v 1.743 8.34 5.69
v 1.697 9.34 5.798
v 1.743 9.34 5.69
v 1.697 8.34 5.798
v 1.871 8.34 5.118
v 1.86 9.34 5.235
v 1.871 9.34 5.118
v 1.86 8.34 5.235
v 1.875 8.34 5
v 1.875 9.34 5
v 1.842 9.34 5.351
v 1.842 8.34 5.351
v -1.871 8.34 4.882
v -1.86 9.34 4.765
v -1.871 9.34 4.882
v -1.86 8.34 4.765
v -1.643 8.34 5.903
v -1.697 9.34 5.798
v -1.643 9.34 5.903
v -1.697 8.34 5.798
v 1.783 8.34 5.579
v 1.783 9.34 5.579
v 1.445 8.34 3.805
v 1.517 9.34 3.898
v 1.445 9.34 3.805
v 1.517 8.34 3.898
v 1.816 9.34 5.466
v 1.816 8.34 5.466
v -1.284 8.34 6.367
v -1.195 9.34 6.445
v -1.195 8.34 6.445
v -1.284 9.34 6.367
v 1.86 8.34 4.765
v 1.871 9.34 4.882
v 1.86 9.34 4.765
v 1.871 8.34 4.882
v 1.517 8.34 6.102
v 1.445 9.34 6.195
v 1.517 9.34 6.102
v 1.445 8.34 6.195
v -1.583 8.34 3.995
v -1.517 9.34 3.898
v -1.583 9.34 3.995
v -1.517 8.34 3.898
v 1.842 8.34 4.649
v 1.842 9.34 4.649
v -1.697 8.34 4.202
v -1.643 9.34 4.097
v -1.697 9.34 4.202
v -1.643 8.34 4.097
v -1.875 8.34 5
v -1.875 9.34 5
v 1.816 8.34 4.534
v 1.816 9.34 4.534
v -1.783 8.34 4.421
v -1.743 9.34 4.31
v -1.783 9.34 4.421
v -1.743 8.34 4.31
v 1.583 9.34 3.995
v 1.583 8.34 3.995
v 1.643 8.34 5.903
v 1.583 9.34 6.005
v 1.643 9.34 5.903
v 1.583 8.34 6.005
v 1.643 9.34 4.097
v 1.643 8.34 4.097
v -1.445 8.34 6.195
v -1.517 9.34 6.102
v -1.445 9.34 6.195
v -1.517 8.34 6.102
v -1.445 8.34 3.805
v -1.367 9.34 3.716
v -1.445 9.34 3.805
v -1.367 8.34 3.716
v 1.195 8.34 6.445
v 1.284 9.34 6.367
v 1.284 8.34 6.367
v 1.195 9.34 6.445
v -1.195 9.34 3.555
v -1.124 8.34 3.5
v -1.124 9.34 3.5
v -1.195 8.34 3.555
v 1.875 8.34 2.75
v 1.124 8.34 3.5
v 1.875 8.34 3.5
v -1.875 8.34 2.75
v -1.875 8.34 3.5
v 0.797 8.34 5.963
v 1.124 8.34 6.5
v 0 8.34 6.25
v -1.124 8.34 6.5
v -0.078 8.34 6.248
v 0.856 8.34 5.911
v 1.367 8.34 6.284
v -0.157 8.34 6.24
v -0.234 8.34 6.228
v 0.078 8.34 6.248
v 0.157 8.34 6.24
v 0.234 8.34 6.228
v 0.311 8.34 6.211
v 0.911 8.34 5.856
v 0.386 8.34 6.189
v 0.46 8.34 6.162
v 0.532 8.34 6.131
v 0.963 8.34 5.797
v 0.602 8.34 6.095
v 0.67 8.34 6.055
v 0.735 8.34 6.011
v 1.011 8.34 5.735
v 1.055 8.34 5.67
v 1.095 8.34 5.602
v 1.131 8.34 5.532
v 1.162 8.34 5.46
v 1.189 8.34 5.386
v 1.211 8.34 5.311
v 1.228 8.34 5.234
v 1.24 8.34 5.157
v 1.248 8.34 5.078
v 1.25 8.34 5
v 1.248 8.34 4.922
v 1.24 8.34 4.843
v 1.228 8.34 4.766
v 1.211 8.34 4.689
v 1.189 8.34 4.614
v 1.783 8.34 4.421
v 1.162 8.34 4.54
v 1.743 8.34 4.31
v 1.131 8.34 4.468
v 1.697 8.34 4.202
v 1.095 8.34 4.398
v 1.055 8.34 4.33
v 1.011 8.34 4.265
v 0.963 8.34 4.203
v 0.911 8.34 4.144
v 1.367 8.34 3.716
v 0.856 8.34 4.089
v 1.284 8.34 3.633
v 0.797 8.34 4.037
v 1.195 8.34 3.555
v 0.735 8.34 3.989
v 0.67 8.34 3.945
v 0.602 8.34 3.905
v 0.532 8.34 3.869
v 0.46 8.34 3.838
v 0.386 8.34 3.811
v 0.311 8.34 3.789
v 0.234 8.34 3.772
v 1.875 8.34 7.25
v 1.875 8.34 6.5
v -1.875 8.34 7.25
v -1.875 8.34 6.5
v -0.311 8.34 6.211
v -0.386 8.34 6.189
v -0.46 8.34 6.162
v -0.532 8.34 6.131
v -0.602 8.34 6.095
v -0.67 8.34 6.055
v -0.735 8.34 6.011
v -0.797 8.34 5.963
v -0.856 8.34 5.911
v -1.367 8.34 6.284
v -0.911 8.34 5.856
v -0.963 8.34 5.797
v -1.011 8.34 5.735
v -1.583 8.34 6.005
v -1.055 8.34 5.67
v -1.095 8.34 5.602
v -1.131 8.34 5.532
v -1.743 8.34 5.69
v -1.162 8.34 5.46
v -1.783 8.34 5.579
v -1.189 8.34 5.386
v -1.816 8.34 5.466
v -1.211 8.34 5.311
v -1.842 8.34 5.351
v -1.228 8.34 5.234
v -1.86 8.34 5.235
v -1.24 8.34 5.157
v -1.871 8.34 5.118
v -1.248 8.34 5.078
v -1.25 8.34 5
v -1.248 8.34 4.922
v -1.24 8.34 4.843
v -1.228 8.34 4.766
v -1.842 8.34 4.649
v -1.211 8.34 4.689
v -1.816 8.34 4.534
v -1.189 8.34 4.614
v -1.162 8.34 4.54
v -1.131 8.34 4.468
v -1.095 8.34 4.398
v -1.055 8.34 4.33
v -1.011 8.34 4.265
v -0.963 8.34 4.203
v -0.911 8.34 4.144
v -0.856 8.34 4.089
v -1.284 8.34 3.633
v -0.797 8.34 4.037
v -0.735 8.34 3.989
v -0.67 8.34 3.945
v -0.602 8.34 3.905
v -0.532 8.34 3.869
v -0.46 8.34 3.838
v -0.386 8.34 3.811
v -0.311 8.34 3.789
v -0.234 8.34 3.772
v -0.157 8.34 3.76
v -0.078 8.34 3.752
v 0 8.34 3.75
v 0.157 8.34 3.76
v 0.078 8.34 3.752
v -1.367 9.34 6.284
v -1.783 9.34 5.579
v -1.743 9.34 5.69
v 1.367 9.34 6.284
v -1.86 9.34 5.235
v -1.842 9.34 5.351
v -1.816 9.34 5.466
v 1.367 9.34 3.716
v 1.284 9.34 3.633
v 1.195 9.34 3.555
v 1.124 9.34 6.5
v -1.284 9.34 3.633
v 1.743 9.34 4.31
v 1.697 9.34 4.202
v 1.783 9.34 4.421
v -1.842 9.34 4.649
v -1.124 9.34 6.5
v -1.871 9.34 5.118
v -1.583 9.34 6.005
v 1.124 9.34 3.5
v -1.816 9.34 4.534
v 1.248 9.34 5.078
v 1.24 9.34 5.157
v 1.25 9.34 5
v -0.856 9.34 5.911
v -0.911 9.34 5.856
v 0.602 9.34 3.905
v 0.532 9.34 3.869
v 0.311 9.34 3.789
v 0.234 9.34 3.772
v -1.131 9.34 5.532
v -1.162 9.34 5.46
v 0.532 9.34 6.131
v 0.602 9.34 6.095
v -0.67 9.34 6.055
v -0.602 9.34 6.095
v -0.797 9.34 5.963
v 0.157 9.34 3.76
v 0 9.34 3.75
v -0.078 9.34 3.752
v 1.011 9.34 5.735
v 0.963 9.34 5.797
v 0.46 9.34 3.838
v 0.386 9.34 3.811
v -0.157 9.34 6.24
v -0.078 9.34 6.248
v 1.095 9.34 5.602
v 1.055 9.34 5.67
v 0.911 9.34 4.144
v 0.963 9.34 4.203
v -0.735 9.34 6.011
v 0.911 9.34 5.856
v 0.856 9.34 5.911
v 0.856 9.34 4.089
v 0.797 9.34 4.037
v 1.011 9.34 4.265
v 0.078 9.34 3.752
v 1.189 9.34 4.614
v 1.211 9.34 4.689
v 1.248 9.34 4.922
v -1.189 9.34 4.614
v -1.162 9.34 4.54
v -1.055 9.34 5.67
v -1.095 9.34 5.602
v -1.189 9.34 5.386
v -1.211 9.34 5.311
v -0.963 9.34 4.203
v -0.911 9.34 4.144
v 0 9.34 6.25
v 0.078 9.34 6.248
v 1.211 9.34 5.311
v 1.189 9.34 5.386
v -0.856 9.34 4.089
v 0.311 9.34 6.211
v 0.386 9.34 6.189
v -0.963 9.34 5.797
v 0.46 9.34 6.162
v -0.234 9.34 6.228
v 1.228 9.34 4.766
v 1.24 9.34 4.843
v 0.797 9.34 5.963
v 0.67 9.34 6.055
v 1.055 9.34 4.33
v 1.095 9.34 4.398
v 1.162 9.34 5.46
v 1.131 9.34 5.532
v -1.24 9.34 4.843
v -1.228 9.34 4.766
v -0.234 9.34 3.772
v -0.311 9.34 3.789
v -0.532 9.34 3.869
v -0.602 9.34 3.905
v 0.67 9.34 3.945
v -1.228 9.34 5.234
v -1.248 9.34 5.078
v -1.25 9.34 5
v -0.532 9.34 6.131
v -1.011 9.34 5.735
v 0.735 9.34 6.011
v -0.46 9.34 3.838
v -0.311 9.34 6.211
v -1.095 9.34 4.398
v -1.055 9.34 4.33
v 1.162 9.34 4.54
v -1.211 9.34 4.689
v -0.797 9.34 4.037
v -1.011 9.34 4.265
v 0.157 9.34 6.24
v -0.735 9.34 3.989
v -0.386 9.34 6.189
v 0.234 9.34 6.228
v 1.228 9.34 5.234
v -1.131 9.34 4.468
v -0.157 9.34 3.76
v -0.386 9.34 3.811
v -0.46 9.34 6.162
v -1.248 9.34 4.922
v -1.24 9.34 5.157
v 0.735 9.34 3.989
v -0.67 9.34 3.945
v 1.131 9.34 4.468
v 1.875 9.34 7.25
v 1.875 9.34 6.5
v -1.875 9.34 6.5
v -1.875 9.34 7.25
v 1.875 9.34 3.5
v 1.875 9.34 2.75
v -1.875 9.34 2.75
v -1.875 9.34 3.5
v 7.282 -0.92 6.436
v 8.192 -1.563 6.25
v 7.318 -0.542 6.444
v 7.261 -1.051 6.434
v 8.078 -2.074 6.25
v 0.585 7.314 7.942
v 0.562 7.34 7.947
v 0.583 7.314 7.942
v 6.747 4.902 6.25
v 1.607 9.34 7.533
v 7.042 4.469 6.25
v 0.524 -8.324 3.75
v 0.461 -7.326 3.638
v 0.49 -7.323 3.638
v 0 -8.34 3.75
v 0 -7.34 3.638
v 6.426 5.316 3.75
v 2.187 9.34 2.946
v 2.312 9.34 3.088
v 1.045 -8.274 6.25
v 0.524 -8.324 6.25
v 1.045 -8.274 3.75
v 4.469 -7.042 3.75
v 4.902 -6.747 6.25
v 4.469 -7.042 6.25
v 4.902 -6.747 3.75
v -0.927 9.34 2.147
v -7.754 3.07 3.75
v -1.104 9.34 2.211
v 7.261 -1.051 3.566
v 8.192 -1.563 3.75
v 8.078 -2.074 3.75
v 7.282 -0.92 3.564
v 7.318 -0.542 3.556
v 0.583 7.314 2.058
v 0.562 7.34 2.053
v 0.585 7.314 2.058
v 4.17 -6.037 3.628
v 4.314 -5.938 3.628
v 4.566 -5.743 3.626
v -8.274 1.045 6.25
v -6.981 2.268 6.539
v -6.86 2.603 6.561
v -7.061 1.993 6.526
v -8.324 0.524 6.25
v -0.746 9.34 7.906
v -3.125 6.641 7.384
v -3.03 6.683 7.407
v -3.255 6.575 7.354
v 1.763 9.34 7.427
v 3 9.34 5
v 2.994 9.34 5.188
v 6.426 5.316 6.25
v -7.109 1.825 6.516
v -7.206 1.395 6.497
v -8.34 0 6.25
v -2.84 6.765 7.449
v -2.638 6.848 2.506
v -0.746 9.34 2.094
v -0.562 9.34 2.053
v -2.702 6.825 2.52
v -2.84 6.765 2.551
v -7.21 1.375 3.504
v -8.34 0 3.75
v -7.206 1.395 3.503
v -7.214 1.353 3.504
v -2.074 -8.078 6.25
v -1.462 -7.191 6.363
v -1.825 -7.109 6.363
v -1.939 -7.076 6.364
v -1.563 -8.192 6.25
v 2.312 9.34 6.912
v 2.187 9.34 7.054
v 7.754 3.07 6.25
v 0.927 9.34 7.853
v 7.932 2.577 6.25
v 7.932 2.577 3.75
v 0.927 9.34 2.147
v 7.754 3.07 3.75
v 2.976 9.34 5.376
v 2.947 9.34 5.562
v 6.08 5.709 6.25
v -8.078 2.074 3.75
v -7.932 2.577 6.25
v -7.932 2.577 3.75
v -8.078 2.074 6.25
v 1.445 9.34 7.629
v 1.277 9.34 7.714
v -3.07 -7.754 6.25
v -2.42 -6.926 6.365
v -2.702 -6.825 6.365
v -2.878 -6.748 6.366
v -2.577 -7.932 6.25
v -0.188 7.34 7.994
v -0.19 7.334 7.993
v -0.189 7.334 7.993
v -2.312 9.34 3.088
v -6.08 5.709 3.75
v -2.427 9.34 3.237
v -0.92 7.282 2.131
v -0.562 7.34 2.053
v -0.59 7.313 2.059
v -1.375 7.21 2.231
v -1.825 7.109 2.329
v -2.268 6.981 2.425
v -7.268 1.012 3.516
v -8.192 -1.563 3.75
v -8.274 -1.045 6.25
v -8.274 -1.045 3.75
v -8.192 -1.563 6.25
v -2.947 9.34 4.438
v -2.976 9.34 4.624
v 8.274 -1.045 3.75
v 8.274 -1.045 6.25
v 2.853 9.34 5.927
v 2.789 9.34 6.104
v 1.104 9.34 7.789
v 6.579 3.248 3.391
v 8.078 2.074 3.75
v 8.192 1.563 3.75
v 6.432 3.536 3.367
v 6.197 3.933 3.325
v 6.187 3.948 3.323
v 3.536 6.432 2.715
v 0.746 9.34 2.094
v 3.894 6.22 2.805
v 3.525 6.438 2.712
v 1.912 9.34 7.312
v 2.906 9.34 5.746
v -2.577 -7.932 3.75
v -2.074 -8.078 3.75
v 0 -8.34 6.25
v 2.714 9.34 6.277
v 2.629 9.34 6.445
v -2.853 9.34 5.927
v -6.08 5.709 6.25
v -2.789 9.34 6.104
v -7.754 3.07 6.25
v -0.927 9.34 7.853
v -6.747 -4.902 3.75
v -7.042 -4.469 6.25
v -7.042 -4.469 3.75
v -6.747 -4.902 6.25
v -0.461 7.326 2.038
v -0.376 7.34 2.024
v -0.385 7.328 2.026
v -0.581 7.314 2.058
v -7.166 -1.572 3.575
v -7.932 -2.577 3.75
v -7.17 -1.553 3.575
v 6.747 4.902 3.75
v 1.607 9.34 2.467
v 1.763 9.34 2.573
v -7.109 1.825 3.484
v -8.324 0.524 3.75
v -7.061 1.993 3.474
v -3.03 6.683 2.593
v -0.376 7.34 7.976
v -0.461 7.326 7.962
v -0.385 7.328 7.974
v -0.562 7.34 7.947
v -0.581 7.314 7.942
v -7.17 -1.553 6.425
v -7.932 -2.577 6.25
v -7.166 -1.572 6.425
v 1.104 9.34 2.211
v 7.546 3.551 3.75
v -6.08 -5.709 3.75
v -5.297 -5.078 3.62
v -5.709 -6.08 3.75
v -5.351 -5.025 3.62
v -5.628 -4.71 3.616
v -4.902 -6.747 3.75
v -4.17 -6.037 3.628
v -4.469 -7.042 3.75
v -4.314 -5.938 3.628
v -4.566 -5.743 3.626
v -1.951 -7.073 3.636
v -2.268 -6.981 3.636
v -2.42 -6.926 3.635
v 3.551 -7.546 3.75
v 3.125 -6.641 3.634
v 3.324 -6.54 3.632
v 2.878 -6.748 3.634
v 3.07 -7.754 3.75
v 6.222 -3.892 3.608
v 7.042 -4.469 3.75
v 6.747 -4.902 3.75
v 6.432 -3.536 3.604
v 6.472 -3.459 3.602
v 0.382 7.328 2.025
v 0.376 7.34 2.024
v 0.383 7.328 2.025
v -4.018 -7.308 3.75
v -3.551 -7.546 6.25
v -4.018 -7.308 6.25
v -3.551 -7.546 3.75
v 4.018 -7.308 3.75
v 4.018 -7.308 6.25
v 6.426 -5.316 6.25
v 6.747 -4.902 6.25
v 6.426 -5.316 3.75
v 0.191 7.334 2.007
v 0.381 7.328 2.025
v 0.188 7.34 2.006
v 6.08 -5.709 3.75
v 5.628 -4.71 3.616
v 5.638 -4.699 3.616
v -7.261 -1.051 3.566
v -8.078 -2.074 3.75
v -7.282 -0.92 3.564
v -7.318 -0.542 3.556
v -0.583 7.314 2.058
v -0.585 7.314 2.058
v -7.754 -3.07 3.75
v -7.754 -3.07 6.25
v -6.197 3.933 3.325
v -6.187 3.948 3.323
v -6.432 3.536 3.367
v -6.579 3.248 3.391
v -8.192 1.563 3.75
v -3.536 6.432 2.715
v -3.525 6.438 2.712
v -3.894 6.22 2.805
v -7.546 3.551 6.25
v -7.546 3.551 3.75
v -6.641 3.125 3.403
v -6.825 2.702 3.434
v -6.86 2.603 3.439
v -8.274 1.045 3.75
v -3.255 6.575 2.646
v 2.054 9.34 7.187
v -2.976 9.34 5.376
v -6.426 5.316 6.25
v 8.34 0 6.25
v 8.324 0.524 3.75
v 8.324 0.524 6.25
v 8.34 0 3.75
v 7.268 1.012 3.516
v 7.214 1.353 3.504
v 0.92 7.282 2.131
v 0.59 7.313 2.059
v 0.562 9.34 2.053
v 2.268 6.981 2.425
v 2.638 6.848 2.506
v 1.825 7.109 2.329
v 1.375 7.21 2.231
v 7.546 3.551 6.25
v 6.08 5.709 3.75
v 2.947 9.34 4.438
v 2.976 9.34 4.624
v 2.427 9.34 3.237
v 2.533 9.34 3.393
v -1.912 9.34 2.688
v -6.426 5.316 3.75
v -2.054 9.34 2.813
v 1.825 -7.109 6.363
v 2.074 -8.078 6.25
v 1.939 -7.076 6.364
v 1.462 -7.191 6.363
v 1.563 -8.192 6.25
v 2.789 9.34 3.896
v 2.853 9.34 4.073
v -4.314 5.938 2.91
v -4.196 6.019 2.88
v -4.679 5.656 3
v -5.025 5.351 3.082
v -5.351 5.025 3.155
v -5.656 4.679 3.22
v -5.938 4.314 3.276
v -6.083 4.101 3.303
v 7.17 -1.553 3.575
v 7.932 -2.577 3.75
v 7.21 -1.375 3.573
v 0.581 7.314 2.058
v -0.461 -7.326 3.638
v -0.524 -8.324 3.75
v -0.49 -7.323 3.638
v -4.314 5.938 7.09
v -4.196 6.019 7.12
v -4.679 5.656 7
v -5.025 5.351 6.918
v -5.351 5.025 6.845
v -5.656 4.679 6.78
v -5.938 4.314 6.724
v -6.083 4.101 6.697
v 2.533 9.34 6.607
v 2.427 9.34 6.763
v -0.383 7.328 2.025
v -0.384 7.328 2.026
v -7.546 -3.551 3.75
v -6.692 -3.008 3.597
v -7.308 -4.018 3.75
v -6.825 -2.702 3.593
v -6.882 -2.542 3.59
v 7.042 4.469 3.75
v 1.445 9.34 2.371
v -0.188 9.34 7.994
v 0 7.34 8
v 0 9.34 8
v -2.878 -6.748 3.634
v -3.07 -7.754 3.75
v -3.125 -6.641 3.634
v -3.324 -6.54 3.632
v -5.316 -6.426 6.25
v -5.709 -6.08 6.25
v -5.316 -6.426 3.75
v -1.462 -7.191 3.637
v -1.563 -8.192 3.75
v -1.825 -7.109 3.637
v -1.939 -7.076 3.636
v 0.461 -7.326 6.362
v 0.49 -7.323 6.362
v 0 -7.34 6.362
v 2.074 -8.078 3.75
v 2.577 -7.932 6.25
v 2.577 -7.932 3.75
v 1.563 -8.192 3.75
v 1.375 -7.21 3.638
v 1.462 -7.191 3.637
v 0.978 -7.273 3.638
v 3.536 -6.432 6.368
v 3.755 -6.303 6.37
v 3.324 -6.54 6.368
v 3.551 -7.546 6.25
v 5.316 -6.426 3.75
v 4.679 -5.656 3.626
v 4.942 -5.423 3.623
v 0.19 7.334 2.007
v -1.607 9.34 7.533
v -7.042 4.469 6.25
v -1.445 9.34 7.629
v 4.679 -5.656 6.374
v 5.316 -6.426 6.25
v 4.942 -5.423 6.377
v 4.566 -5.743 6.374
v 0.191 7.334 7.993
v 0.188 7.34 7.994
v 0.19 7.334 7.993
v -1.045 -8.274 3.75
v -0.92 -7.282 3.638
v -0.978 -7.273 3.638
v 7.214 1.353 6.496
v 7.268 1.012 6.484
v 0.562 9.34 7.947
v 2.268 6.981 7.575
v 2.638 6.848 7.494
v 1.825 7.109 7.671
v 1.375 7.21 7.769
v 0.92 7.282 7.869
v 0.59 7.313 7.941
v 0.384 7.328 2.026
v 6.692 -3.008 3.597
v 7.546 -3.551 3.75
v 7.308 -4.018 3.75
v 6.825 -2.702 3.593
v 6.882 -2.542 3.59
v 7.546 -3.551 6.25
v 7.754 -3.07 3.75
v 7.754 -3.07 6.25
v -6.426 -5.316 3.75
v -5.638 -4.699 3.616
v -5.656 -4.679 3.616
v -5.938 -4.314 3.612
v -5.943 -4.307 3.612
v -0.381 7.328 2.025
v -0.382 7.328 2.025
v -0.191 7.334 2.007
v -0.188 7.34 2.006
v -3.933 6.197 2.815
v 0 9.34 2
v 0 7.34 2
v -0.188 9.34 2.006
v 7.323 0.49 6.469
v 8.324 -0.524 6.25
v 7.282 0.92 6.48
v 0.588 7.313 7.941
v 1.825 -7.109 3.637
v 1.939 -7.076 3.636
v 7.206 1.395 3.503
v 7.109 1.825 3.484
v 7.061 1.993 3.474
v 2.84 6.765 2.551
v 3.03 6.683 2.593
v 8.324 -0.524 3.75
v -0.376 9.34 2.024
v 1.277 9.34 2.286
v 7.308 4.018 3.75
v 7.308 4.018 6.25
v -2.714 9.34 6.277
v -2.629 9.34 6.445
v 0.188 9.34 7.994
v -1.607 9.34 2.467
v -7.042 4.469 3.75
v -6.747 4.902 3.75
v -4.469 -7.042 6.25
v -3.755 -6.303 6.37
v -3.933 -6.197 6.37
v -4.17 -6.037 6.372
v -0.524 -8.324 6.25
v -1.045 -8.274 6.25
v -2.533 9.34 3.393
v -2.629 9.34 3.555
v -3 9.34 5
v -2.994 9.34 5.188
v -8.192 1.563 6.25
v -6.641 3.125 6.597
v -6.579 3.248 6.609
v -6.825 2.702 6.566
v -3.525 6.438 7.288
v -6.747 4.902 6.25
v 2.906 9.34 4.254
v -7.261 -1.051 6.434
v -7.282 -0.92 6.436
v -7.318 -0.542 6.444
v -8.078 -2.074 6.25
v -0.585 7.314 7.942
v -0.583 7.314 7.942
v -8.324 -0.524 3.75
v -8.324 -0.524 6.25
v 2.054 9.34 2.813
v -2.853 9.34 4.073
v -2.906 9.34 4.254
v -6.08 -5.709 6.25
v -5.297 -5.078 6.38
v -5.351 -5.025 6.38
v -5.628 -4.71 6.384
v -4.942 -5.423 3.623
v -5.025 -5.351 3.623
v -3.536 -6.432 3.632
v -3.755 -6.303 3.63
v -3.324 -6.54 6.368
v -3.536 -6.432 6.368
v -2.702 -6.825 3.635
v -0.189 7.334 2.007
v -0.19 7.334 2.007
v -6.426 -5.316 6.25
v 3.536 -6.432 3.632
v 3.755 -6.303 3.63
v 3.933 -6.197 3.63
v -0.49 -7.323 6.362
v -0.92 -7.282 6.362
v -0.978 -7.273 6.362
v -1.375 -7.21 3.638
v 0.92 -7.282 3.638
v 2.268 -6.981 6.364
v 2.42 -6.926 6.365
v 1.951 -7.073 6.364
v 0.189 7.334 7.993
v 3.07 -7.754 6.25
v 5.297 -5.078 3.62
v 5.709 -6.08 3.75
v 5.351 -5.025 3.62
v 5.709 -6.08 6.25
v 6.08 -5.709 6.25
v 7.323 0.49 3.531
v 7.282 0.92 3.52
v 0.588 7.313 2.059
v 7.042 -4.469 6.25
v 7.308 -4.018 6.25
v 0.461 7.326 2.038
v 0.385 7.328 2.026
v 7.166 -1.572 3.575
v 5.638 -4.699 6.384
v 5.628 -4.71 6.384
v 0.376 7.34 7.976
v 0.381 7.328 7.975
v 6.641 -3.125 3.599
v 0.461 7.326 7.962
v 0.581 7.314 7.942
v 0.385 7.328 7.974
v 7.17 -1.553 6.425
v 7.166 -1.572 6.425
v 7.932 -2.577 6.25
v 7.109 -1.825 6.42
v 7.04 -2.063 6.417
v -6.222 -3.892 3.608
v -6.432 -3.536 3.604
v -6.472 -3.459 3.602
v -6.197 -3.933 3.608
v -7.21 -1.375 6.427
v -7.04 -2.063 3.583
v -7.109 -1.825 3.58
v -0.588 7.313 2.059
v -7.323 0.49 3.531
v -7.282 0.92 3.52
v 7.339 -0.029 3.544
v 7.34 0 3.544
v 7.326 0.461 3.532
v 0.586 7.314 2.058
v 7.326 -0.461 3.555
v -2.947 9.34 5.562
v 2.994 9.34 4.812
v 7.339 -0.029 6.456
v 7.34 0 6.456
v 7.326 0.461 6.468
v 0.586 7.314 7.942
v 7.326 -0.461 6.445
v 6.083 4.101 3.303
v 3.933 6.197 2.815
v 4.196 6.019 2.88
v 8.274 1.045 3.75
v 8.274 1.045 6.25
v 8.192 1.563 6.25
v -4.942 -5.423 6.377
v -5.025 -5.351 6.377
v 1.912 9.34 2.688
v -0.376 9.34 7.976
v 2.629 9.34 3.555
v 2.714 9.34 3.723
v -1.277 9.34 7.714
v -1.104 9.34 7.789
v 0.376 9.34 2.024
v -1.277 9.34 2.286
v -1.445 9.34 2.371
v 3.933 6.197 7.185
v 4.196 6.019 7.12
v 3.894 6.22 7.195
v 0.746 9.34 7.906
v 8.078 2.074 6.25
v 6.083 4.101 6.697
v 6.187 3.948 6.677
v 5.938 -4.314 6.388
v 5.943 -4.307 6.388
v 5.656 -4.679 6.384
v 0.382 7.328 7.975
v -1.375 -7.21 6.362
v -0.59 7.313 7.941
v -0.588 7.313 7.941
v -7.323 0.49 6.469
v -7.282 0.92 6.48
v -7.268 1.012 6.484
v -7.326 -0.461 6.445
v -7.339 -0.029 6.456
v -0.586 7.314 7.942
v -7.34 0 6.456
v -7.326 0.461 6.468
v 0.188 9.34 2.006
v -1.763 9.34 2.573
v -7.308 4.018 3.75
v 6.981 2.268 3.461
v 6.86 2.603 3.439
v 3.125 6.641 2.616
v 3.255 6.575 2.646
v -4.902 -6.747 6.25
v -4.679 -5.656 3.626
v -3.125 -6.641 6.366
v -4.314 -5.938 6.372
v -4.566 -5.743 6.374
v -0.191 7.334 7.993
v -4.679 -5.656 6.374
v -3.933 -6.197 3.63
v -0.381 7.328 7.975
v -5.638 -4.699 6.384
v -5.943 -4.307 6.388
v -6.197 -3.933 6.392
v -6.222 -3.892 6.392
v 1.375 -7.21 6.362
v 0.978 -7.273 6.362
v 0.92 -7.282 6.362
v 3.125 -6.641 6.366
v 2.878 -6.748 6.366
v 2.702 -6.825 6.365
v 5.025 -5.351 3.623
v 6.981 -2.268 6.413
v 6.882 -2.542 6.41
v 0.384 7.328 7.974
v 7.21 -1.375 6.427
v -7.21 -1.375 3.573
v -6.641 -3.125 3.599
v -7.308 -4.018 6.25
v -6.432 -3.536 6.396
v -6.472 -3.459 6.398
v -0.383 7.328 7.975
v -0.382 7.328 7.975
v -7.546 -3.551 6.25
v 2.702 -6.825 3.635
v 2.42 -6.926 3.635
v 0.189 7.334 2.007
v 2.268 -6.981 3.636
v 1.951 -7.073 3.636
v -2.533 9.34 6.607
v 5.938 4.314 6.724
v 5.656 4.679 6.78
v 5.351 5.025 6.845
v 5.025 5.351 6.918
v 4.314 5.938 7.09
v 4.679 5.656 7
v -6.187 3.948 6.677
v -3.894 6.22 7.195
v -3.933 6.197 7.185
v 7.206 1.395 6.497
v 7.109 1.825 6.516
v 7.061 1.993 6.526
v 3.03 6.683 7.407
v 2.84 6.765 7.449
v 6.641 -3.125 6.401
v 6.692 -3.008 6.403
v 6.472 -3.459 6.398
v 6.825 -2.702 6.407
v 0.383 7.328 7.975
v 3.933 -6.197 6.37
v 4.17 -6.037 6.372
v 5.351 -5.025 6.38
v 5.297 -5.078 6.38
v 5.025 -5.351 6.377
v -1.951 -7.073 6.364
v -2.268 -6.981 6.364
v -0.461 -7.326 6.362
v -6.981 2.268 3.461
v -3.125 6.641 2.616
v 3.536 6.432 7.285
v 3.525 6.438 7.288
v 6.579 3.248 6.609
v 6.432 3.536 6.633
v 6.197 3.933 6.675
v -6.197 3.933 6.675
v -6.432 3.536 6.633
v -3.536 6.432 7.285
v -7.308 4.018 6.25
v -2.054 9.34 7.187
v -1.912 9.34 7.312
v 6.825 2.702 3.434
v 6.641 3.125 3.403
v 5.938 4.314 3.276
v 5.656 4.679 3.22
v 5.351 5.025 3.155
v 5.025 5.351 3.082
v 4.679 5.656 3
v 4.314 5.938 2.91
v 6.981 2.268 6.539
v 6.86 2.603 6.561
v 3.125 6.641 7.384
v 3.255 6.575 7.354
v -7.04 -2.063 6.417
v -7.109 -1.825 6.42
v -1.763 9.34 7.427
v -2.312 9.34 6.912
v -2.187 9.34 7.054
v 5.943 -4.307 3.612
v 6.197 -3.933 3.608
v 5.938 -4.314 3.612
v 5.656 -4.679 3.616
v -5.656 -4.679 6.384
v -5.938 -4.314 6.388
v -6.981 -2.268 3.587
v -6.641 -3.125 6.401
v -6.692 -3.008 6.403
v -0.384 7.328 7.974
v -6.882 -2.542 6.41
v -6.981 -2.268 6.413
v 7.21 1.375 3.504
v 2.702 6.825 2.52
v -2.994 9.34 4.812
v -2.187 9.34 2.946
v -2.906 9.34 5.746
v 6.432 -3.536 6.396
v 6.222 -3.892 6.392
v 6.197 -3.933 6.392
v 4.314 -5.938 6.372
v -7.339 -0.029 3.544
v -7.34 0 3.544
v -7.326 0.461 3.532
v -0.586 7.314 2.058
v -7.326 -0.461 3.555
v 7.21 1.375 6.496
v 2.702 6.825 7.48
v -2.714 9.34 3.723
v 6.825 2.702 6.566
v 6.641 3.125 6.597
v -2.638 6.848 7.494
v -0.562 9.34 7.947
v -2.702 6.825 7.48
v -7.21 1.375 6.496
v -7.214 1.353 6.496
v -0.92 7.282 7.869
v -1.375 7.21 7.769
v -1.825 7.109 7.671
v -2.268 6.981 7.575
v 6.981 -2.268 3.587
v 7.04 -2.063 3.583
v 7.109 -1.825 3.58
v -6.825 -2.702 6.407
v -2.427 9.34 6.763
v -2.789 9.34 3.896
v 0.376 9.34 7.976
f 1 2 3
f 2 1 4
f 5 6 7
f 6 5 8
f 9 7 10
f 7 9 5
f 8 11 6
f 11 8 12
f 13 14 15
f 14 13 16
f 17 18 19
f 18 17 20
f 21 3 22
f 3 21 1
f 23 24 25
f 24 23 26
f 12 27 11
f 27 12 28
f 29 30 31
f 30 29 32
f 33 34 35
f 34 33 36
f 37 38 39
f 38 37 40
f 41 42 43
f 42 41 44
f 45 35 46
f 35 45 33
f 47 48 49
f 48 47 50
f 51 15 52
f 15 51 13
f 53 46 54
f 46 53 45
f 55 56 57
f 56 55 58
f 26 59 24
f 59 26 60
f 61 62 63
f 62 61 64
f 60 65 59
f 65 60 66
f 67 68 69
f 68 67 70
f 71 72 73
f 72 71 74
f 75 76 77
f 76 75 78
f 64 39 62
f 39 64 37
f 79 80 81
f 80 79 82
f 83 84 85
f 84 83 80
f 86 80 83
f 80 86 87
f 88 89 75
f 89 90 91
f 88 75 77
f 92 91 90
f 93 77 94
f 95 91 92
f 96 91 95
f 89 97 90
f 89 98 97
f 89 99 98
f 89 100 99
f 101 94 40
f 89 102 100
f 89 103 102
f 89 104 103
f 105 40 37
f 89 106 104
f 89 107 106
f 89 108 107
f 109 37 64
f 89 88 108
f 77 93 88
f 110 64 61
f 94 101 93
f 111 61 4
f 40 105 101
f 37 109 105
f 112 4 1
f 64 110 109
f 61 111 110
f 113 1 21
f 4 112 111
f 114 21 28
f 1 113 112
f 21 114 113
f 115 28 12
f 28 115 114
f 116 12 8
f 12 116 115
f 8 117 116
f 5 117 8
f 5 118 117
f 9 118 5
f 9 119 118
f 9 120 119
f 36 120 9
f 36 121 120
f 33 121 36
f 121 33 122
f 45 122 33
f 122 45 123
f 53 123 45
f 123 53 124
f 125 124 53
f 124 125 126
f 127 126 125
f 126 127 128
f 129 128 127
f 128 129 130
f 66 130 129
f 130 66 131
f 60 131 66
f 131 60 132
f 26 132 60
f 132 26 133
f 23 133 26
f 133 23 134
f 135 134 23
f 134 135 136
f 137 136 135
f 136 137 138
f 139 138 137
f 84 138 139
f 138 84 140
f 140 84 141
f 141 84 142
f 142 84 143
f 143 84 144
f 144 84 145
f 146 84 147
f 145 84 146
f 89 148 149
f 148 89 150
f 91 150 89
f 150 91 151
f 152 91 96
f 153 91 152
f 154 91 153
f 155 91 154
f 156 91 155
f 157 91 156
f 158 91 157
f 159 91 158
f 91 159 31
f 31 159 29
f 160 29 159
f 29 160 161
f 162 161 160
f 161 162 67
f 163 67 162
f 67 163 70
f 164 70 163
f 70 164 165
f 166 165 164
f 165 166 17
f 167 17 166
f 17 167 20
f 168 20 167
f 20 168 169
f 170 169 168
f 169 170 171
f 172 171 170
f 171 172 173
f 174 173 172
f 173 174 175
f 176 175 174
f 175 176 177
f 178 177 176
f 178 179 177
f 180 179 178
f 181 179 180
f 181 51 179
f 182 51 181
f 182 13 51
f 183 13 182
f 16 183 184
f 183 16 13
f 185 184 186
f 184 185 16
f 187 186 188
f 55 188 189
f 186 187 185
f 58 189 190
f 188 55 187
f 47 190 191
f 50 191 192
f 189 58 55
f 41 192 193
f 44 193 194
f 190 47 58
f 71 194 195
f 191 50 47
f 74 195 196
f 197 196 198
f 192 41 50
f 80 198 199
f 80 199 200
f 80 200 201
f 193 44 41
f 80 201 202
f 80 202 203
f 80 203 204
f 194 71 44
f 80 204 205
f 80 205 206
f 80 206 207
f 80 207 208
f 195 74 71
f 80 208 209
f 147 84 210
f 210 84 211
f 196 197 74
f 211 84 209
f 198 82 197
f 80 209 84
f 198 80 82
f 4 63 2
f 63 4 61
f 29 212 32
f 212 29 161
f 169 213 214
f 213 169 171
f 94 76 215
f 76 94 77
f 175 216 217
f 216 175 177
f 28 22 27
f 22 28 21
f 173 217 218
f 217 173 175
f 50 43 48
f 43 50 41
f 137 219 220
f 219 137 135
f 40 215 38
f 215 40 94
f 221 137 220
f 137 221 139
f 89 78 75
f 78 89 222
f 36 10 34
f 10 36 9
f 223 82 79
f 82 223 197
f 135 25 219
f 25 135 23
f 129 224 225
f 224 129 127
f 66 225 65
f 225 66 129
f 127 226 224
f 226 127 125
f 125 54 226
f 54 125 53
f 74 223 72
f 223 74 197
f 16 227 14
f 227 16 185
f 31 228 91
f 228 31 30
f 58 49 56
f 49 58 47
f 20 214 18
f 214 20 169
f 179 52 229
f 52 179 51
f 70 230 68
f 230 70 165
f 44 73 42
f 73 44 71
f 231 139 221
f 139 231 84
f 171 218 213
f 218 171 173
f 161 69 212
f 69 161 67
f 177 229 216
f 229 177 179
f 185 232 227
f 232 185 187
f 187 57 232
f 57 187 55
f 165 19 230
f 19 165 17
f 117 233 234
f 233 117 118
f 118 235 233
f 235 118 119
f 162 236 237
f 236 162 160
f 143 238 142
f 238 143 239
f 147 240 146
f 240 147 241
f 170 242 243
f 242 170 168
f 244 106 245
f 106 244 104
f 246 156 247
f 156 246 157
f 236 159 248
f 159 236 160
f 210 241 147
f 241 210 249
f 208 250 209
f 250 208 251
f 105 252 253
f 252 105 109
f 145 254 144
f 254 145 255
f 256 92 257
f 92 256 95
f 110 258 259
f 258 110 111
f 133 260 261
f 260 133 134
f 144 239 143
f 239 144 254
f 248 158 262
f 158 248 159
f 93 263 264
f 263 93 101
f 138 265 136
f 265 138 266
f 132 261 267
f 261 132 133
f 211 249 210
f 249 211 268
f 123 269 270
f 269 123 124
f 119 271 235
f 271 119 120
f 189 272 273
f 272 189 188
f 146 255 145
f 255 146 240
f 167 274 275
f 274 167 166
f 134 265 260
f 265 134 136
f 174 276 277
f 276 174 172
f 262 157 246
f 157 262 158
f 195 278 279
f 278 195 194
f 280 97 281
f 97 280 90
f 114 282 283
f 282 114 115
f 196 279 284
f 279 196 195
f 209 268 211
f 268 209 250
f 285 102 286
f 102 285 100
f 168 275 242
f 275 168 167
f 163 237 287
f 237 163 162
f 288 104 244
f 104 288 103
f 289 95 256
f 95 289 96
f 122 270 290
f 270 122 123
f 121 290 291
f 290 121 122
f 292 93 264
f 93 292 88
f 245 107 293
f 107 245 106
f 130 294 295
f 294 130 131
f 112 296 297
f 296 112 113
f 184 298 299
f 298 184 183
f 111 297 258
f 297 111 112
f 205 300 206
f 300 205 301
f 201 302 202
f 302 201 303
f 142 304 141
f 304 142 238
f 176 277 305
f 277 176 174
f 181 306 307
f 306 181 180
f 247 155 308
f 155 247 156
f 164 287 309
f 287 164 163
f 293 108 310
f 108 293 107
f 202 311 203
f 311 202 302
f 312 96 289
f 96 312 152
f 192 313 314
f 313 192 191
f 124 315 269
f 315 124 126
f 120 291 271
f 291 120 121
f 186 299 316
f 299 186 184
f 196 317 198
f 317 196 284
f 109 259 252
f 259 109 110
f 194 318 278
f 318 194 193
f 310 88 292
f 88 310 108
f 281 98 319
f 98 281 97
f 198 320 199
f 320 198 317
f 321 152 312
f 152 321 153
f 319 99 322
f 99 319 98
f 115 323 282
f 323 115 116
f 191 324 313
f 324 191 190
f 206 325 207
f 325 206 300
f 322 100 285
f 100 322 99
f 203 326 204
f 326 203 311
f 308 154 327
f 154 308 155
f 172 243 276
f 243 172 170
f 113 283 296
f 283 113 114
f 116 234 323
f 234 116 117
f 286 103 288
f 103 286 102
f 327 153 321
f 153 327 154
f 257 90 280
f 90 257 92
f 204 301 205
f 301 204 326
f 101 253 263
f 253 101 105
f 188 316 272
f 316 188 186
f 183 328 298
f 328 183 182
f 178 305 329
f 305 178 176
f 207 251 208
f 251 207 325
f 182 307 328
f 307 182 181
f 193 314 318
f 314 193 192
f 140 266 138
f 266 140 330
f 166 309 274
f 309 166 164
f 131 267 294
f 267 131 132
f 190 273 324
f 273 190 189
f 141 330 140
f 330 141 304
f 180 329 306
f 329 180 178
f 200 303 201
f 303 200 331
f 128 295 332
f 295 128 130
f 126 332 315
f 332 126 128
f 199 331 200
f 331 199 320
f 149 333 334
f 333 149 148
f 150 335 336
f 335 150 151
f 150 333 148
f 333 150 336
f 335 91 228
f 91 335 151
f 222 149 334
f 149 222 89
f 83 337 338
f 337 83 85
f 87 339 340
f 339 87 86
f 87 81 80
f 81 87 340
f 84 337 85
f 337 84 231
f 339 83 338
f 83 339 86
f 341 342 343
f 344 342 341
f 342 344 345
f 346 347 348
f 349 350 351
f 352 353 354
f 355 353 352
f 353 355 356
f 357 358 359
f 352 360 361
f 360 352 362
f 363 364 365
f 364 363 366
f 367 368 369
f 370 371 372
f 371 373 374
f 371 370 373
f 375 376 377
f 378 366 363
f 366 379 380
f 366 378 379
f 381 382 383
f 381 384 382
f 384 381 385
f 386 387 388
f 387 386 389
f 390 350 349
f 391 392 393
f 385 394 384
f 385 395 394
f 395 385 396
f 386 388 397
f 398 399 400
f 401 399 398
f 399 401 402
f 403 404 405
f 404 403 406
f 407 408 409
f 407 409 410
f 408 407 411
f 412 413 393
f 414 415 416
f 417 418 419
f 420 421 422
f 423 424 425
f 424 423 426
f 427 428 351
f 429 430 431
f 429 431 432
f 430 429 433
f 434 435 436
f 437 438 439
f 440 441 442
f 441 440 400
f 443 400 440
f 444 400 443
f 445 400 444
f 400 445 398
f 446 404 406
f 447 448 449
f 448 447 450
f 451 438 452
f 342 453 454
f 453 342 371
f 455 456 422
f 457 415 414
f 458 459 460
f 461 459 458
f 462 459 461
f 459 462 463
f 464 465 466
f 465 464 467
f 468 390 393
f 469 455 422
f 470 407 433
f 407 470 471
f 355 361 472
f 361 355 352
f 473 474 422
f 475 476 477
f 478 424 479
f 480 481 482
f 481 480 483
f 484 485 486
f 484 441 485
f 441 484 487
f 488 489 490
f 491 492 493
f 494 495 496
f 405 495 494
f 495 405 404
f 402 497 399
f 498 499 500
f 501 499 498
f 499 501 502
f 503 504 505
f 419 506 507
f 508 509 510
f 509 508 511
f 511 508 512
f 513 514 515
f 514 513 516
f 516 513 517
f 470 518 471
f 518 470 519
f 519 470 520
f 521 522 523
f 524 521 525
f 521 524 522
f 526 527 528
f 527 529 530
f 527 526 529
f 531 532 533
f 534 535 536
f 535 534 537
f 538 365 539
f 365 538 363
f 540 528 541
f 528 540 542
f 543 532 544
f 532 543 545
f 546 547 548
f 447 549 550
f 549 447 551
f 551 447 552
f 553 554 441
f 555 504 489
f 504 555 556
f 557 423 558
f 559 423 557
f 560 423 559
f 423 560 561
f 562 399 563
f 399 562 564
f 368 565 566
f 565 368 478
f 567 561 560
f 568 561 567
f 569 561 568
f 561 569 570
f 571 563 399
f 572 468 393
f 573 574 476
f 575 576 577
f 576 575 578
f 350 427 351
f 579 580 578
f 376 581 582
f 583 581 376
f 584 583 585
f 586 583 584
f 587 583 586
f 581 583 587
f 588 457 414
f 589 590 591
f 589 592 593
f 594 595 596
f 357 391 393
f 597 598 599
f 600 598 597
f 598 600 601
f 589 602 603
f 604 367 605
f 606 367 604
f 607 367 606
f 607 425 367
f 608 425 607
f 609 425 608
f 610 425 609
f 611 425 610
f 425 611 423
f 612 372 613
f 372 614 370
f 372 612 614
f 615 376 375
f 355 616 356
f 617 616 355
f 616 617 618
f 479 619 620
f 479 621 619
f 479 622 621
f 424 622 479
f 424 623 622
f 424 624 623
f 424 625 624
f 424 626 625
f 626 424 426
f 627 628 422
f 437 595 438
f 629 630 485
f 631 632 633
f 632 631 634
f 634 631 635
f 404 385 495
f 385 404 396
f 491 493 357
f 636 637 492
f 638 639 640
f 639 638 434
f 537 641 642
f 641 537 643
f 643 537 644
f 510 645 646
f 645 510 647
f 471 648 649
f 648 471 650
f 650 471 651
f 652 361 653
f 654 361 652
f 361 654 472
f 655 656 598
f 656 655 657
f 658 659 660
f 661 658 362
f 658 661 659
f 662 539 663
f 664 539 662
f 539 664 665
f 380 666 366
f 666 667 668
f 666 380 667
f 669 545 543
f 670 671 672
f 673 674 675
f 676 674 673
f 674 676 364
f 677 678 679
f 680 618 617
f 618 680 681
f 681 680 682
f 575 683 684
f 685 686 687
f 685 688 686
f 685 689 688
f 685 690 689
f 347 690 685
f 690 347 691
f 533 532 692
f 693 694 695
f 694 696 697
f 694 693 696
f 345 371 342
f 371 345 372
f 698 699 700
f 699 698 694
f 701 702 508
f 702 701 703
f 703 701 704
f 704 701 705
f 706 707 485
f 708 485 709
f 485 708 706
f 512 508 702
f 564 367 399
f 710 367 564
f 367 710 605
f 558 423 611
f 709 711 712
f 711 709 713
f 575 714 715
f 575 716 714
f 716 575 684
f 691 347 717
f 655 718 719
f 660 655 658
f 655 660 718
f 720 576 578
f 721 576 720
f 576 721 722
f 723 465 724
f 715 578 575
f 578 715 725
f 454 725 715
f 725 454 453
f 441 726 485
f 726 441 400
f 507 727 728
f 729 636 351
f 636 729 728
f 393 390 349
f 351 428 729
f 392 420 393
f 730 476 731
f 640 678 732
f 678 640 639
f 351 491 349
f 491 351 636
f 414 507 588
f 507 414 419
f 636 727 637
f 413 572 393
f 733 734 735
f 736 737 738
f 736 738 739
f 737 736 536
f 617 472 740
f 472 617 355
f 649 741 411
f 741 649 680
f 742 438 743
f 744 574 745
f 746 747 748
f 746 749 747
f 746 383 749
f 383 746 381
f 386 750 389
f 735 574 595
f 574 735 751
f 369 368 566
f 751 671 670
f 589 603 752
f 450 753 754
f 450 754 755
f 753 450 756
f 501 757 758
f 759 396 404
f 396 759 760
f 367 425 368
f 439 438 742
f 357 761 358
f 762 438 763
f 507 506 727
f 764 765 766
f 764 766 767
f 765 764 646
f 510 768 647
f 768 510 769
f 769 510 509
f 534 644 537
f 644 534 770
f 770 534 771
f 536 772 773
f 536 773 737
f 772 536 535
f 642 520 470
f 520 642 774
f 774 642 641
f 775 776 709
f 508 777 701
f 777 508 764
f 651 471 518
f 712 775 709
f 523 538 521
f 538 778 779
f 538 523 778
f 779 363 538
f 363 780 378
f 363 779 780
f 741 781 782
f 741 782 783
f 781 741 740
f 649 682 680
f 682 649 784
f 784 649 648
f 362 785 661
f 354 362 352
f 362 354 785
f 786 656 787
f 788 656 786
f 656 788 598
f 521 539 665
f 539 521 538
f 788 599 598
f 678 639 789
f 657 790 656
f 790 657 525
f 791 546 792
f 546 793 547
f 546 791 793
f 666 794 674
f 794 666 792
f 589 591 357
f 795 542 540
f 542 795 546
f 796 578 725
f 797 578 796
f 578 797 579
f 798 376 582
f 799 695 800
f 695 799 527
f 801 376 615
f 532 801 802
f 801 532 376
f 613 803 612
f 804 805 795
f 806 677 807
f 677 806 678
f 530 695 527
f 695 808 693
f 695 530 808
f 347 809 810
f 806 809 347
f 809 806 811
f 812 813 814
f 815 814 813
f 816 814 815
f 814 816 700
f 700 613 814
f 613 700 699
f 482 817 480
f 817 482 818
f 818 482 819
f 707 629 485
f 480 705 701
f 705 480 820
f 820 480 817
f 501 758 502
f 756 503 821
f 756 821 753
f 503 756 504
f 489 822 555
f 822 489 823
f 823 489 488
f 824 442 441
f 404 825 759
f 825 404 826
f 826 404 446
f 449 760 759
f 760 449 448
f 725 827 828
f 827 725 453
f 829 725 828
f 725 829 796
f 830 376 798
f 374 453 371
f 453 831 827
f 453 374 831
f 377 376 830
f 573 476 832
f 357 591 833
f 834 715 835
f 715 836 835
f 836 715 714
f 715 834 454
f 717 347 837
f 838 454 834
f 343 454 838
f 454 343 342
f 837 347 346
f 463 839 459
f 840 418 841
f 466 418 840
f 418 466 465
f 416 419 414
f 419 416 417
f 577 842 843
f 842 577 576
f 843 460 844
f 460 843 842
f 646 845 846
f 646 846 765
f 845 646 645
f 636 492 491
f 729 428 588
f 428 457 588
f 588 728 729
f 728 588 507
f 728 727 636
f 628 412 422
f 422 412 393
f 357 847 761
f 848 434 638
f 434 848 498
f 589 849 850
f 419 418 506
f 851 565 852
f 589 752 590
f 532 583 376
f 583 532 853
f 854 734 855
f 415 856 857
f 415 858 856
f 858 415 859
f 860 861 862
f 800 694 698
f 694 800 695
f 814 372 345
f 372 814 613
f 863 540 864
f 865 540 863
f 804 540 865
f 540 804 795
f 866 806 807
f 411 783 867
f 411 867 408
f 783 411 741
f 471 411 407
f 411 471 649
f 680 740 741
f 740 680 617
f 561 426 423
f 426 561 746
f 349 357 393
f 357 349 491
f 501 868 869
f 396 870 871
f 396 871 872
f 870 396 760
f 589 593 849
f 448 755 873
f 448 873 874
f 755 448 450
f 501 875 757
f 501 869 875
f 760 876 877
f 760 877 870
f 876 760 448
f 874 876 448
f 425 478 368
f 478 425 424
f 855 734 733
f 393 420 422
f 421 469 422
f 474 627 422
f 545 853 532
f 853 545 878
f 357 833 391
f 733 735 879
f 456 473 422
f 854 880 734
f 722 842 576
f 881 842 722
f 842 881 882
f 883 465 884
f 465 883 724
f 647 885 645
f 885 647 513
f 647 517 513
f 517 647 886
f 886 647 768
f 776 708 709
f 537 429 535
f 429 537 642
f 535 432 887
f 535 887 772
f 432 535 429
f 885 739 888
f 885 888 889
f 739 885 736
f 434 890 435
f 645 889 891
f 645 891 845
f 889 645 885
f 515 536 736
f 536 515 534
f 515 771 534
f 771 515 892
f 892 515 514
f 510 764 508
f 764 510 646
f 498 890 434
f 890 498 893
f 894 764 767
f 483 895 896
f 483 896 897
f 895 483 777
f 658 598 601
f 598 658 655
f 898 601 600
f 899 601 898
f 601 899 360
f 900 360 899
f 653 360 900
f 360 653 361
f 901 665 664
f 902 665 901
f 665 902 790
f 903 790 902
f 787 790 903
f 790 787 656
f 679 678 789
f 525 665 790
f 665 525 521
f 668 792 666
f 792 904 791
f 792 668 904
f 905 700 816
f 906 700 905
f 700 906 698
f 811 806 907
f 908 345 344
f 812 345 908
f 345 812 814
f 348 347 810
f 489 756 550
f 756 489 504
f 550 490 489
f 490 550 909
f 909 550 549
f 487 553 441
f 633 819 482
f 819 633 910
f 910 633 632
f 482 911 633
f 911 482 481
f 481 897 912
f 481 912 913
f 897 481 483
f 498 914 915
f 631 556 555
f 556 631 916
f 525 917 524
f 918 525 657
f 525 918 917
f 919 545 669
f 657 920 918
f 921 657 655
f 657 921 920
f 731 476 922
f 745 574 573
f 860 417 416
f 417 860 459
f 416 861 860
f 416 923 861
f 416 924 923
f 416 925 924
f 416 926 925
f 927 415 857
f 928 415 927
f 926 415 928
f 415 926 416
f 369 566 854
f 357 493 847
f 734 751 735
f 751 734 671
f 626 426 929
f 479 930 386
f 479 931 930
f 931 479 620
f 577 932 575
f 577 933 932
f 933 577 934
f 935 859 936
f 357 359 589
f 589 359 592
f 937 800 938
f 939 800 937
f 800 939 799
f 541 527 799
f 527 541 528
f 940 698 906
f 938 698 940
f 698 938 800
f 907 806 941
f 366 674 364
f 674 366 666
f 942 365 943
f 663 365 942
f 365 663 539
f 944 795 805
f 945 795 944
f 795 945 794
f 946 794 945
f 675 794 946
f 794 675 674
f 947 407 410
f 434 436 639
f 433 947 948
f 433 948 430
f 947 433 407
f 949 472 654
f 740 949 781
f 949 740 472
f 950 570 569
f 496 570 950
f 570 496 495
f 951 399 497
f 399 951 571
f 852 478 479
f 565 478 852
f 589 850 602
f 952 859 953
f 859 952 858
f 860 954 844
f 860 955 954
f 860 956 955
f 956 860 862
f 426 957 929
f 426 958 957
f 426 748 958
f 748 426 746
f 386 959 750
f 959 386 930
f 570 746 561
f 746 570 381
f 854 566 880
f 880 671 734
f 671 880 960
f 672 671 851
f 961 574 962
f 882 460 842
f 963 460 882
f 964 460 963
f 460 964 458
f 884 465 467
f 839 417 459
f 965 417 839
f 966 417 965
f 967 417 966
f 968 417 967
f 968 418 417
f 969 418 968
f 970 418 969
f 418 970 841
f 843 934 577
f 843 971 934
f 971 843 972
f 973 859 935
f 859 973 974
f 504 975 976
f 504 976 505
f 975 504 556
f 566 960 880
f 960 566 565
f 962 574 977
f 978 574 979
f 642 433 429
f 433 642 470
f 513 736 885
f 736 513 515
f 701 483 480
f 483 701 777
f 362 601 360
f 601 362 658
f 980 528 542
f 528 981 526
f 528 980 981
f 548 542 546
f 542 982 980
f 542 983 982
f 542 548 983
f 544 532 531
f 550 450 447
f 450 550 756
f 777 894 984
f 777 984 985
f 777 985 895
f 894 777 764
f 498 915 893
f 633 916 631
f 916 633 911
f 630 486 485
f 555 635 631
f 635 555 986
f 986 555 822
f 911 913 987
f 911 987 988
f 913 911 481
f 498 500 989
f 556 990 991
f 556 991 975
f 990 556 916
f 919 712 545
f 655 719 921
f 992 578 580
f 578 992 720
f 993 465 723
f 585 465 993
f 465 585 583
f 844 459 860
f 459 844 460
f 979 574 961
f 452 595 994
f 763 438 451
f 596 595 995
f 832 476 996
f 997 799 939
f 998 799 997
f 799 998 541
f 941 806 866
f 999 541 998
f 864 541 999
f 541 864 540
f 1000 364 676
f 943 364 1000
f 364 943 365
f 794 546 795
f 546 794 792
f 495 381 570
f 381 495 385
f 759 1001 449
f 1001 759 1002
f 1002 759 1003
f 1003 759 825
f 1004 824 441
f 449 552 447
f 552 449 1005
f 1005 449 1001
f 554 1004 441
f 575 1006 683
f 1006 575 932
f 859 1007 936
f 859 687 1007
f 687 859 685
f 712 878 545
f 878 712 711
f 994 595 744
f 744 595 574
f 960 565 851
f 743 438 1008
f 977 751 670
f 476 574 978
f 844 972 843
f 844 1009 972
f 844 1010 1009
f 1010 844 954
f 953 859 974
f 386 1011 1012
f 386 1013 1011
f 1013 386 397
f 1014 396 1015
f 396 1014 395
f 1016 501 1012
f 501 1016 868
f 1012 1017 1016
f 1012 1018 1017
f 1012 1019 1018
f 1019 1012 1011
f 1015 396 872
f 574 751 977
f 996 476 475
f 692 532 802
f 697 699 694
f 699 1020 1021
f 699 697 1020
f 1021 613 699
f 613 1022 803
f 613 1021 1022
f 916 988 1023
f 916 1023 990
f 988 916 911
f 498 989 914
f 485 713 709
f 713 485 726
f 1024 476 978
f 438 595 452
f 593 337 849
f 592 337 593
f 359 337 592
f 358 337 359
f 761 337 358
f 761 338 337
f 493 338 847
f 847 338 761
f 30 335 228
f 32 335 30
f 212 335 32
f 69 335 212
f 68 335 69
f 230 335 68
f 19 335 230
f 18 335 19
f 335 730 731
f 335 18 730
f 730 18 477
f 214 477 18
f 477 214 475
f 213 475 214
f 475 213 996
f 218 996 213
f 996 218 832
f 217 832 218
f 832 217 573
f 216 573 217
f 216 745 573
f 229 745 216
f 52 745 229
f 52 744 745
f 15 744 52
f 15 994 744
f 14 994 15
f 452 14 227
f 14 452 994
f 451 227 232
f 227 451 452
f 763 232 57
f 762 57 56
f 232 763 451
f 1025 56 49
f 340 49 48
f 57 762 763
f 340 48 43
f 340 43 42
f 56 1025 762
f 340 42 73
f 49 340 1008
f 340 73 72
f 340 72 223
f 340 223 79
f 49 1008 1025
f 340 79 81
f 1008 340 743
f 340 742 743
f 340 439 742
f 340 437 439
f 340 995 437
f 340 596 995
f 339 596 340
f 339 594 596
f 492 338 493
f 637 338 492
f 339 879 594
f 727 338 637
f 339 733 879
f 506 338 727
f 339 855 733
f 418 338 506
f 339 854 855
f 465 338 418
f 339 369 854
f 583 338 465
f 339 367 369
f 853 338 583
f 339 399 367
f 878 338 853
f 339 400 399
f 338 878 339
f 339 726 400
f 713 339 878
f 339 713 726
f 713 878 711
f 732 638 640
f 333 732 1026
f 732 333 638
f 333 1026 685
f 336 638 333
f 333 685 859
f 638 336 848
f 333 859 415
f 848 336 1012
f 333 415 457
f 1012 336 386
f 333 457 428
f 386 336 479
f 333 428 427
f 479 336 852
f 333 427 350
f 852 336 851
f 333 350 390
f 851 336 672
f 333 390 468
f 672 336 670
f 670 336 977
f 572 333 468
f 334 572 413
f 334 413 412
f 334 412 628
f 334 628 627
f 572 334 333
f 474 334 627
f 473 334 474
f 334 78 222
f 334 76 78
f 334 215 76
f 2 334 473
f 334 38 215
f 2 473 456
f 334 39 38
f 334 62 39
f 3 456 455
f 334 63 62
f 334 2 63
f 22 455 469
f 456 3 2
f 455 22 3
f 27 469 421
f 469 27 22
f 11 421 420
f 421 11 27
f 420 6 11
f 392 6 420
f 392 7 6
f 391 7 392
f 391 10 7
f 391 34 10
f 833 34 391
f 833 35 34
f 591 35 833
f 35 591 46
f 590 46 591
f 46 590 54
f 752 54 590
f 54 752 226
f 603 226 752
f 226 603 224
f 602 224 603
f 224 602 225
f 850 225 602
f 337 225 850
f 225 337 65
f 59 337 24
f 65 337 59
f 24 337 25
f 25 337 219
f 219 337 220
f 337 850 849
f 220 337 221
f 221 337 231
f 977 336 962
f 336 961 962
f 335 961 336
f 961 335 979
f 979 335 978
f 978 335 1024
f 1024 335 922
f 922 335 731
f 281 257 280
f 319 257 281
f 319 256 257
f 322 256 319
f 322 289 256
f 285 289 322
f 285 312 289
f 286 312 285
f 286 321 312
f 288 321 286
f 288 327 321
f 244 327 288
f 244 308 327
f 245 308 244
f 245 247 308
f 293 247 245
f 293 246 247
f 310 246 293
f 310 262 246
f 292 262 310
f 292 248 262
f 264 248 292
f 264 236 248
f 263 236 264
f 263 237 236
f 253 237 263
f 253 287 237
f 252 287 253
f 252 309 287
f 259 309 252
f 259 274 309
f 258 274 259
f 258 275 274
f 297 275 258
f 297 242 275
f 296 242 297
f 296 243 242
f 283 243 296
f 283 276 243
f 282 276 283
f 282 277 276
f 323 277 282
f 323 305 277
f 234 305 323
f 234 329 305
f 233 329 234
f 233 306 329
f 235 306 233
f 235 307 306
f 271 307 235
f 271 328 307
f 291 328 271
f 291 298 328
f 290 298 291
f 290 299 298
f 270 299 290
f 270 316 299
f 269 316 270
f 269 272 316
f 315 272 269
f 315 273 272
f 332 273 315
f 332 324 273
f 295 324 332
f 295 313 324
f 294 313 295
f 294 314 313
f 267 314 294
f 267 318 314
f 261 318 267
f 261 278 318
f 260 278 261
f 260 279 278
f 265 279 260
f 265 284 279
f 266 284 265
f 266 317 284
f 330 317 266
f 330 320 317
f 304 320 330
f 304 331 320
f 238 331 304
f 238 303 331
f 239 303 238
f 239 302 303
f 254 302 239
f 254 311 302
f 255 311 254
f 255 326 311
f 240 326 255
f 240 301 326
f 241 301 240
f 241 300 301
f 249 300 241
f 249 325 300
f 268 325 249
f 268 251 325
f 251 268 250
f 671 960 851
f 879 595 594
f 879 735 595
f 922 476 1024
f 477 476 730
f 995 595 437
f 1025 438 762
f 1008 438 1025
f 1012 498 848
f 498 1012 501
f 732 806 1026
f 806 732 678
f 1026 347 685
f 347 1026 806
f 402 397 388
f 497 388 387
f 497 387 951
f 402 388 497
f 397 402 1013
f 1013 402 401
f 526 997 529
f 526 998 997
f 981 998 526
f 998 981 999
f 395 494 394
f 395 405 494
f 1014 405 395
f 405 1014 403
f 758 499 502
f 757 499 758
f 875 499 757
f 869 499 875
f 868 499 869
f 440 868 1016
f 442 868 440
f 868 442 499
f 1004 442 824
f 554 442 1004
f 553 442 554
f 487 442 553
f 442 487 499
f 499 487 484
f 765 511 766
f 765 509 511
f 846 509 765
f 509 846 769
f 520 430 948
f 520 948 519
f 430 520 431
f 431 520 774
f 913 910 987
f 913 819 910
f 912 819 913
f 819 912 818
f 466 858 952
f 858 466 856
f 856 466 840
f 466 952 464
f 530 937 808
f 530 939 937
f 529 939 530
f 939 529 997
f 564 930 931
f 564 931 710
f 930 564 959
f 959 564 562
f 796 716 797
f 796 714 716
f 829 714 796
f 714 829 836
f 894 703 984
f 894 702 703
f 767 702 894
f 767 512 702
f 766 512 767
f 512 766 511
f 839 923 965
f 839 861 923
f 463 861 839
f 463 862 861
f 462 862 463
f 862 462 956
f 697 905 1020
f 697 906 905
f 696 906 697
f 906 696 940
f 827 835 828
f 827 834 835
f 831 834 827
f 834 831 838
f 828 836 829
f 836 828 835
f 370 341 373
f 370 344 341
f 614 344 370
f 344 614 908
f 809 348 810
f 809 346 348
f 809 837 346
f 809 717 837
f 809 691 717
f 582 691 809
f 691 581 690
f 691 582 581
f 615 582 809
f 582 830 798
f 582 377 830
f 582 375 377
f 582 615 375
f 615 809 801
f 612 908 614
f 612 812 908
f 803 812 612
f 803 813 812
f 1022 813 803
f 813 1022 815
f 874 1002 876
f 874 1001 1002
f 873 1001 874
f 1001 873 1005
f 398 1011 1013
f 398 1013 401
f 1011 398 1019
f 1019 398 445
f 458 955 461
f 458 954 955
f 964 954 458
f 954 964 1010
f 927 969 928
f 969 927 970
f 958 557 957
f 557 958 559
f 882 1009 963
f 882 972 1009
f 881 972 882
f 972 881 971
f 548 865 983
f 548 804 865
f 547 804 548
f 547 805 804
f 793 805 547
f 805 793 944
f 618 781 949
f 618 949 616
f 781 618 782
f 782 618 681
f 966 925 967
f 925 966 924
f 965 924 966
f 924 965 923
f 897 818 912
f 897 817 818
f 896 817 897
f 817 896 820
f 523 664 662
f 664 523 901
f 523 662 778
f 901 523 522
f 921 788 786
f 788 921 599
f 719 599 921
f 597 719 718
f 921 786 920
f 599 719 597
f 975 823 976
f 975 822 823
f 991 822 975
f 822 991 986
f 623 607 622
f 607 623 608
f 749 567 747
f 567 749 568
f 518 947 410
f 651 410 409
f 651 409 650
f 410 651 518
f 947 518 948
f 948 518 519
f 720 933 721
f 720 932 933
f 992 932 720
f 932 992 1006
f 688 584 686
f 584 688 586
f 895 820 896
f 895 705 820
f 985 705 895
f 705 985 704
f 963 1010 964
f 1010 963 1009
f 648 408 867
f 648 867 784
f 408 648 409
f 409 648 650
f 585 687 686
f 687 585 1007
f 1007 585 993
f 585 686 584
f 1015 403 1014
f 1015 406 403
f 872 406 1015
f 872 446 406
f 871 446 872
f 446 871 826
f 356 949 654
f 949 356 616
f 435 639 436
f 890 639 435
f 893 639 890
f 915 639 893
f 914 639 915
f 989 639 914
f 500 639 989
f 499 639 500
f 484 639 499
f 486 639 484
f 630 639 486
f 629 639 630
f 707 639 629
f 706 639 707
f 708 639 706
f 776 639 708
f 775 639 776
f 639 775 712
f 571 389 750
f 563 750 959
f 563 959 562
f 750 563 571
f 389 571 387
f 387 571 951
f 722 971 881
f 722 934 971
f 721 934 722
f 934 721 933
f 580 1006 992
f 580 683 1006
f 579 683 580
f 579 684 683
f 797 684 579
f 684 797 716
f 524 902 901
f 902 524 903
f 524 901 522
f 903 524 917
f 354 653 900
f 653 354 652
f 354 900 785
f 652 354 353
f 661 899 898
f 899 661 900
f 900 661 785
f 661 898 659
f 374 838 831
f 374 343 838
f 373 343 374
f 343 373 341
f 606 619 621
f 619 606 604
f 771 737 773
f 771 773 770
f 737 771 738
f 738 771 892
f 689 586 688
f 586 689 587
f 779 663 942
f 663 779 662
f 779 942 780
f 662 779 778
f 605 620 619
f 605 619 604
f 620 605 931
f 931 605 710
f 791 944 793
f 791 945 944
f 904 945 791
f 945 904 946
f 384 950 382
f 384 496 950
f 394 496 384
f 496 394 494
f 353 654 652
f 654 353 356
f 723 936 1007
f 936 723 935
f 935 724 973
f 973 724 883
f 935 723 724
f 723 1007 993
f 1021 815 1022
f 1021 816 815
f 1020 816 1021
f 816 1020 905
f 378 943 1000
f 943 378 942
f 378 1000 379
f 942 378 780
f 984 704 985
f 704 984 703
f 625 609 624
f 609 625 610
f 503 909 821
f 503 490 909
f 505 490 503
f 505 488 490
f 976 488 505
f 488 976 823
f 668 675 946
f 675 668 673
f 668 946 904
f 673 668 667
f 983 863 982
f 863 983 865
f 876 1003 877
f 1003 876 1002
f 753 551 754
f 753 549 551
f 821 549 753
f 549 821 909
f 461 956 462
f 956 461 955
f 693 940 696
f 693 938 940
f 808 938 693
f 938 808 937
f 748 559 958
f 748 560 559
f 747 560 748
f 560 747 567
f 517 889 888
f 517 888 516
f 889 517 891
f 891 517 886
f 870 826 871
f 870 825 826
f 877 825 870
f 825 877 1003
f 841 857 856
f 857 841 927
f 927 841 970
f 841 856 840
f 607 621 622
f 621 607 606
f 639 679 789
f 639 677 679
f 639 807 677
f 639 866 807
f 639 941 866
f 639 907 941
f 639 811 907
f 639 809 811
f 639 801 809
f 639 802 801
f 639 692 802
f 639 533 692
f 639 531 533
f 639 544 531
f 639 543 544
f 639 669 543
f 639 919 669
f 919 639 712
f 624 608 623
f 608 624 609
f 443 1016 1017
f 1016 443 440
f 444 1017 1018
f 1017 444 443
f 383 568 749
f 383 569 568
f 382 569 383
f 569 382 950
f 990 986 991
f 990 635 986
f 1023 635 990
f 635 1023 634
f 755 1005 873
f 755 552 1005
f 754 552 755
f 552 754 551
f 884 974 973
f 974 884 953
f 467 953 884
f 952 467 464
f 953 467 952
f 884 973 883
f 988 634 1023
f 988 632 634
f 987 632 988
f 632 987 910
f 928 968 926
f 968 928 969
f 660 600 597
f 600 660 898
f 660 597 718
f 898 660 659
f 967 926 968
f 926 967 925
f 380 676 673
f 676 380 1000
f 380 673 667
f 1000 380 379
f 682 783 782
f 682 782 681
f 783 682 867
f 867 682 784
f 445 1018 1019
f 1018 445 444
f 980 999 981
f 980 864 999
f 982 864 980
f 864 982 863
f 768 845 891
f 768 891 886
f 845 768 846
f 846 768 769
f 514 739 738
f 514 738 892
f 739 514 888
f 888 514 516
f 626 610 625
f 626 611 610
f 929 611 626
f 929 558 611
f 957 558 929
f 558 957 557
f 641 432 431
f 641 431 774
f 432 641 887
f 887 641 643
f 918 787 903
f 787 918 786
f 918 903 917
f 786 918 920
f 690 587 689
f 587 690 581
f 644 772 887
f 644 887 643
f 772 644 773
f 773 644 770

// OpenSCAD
//ring = 14.48;
ring = 14.68;
wd = 2;
detail = 7.5;
detailsz = 6;
$fn=100;
ht = 10;

module lantern(){
    union(){
        translate([0,detail/4,0.5]){
            cube([detail/2, detail/10, 1], center=true) ;
        }
        translate([0,-detail/4,0.5]){
            cube([detail/2, detail/10, 1], center=true) ;
        }
        difference(){
            cylinder(d=detail/2, h=1);
            cylinder(d=detail/3, h=1.1);
        }
    };
}

difference(){
hull(){

translate([0,0,ht/2]) {   
cylinder(d=ring+wd, h=ht/4, center=true);
}
//translate([0,ring/2 + wd -1, ht/4 + detailsz/2])
translate([0, ring/2 + wd -1, ht/2])
rotate([90,90,0])
#cylinder(d=detailsz , h=2, center=true);
}
cylinder(d=ring, h=20, center=true);
translate([0,ring/2 + wd, ht/2])
rotate([90,0,0])
lantern();
}
%cylinder(d=ring, h=20);

   
 
